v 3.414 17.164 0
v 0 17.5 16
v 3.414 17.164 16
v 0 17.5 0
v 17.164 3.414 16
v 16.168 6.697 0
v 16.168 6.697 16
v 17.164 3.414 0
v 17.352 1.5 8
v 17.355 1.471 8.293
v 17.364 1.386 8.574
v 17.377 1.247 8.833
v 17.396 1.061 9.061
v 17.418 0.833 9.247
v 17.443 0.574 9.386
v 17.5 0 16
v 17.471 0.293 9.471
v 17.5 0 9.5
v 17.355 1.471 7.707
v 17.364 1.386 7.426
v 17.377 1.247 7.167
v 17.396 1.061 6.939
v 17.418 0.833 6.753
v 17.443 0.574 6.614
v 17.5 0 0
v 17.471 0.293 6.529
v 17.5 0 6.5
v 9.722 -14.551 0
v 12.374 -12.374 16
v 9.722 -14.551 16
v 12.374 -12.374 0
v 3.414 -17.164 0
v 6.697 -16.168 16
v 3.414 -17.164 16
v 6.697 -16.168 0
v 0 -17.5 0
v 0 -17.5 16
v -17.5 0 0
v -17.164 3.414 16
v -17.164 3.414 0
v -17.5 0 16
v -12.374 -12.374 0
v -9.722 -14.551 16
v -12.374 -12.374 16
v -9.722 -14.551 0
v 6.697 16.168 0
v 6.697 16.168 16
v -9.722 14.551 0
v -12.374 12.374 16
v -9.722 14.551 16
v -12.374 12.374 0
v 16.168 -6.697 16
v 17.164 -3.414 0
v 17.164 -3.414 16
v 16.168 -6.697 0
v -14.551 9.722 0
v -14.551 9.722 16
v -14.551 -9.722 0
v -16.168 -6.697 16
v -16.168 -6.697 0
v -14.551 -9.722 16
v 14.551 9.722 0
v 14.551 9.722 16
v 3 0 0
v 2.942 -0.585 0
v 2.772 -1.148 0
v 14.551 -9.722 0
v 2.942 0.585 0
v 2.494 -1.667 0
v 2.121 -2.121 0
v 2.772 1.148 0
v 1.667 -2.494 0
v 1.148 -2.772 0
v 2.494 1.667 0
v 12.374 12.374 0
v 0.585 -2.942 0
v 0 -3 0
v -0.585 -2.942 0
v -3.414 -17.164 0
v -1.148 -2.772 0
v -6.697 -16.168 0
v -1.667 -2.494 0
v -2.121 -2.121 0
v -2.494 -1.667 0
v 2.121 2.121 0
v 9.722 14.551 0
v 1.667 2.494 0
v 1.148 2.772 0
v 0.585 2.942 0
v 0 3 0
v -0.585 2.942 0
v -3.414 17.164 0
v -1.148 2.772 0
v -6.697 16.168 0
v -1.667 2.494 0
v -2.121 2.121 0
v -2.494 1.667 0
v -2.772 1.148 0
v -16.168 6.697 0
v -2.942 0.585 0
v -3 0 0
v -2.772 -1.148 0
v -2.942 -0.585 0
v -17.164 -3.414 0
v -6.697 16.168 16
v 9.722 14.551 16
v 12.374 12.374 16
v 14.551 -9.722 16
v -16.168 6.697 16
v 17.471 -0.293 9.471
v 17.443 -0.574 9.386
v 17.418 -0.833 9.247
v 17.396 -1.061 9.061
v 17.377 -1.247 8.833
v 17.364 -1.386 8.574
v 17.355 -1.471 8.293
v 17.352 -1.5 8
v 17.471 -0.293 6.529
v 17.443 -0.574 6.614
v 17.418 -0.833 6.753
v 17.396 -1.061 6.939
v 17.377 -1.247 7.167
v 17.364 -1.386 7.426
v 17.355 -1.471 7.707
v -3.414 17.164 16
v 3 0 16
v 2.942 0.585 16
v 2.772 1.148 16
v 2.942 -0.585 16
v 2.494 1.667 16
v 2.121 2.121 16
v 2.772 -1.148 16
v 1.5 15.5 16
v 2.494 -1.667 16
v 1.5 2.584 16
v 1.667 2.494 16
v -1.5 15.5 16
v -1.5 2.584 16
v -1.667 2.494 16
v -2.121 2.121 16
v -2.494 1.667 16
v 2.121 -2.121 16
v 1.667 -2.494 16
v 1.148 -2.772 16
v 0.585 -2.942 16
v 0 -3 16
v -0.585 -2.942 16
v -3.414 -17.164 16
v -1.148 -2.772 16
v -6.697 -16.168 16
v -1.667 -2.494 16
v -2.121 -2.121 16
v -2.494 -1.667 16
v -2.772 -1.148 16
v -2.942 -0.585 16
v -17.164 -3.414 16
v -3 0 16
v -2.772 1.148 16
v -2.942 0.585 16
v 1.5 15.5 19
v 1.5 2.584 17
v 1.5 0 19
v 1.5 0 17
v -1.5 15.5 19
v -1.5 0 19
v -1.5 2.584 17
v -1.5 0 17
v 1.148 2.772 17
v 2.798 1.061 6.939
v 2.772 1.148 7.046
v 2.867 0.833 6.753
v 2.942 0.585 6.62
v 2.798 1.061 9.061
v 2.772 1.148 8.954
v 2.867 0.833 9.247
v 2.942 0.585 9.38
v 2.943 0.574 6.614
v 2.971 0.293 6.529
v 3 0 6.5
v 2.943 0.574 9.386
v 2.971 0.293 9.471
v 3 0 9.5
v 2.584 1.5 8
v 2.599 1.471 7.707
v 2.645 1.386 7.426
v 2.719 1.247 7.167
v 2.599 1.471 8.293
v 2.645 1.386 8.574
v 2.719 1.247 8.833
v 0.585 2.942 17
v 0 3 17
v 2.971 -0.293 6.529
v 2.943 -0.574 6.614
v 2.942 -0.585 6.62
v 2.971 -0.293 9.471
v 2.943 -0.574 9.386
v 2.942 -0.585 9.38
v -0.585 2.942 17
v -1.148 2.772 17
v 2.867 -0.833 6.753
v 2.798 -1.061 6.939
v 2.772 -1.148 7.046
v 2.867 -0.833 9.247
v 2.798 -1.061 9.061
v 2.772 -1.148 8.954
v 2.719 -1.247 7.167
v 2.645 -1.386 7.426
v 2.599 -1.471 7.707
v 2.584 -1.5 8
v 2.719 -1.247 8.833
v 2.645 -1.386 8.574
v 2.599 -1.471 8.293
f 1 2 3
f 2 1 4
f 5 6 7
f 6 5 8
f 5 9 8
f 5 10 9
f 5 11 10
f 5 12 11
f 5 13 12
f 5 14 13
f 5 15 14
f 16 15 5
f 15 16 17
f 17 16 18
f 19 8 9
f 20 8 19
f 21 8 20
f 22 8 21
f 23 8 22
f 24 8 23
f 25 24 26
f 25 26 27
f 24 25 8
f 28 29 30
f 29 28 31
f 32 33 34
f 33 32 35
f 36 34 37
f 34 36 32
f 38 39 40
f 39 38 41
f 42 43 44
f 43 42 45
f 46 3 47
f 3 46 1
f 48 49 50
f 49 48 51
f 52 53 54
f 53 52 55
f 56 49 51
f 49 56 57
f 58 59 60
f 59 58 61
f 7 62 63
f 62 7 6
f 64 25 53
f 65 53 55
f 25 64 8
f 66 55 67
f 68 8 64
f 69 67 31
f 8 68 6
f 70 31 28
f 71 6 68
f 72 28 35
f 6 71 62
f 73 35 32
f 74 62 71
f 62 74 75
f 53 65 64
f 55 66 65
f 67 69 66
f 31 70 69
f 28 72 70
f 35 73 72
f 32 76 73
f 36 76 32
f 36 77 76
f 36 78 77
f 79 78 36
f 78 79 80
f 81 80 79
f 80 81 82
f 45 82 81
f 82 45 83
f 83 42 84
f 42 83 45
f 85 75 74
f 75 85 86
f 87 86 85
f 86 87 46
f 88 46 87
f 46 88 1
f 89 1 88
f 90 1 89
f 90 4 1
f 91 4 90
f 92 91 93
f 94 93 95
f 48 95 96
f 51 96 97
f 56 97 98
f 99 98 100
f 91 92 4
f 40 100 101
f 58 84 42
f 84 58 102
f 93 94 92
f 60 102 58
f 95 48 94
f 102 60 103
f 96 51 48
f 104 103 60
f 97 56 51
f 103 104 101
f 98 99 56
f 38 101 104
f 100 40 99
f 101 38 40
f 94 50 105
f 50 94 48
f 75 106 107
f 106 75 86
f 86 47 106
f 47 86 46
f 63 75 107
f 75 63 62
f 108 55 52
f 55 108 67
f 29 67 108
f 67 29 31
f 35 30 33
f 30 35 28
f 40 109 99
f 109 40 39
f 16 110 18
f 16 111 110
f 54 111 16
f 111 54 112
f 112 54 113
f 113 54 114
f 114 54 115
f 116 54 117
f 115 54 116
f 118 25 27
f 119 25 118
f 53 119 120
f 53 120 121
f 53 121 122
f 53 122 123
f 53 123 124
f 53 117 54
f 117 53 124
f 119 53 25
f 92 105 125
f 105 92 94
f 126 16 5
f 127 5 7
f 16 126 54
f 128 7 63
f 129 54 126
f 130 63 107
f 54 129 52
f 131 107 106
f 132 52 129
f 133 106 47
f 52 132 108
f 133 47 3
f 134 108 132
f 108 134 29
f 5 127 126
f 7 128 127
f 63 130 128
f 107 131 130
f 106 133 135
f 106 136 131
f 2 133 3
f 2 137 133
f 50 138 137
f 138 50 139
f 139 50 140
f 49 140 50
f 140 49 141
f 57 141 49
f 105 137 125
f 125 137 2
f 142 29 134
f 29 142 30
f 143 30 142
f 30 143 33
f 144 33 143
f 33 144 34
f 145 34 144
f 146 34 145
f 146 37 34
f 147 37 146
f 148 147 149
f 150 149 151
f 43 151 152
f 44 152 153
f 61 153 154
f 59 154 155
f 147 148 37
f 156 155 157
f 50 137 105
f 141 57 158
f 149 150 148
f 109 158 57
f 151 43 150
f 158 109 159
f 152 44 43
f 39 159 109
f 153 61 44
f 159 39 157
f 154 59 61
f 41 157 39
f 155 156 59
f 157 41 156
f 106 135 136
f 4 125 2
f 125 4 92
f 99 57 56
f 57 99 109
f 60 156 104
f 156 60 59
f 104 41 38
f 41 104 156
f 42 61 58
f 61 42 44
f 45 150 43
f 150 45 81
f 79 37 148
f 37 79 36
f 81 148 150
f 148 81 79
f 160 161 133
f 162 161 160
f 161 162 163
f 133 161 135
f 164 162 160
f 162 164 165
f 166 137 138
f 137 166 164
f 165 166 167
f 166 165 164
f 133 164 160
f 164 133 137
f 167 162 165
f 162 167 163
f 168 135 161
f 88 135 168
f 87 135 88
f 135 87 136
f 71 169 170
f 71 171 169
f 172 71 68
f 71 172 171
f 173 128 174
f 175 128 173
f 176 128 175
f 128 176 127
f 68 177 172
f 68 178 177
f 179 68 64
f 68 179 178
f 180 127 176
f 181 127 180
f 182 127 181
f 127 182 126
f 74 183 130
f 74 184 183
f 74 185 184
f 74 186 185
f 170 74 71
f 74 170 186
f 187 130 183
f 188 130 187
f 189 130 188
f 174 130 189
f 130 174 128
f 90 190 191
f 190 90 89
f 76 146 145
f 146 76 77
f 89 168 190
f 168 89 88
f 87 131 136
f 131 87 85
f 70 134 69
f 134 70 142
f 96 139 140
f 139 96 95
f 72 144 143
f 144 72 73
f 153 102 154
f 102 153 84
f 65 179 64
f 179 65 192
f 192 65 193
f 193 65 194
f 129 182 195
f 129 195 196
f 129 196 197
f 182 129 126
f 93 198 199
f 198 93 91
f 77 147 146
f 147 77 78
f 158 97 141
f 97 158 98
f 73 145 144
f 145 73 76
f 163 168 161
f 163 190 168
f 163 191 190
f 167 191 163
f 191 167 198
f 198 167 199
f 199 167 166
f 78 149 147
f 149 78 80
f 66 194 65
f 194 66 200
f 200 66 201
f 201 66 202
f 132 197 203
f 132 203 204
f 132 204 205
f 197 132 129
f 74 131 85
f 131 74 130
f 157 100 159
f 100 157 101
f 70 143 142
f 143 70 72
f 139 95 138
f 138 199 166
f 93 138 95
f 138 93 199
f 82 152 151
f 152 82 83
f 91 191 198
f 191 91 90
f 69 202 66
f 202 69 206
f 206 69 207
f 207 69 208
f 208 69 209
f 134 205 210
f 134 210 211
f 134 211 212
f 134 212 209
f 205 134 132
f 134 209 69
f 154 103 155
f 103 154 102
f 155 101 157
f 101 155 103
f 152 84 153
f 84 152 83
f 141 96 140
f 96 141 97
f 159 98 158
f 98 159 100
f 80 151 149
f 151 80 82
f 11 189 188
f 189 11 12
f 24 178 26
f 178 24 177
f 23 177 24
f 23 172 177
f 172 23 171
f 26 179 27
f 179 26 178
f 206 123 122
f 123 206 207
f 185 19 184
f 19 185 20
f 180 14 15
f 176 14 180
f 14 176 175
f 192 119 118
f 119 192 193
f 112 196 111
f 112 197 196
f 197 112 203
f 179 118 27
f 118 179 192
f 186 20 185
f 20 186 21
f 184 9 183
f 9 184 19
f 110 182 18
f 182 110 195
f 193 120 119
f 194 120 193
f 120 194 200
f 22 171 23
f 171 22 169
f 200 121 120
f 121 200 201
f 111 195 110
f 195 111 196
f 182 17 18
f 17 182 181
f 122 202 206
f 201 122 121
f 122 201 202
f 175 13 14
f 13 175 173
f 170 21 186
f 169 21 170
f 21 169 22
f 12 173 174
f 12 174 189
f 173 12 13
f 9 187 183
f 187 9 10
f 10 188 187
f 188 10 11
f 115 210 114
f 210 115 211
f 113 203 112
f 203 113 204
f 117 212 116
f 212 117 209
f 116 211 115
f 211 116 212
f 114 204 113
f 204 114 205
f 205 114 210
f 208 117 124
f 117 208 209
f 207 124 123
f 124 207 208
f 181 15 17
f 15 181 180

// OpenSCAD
$fn = 32;

// ----------------------------------------------------------------------
// Control knob: pointer knob
// ----------------------------------------------------------------------

// --- parameters (mm) ---
rib_w = 3;                // pointer rib width
rib_h = 4;                // pointer rib height
knob_d = 35;              // knob body diameter
knob_h = 16;              // knob body height
bore_d = 6;               // shaft bore diameter
set_d = 3;                // set screw bore diameter

rib_poke = rib_h - 1;  // rib height above the top
total_h = knob_h + rib_h - 1;  // overall height

difference() {
  union() {
    cylinder(h = knob_h, d = knob_d);
    translate([-rib_w / 2, 0, knob_h - 1])
      cube([rib_w, knob_d / 2 - 2, rib_h]);
  }
  translate([0, 0, -1]) cylinder(h = knob_h + 2, d = bore_d);
  translate([-1, 0, knob_h / 2]) rotate([0, 90, 0])
    cylinder(h = knob_d / 2 + bore_d / 2 + 2, d = set_d);}
